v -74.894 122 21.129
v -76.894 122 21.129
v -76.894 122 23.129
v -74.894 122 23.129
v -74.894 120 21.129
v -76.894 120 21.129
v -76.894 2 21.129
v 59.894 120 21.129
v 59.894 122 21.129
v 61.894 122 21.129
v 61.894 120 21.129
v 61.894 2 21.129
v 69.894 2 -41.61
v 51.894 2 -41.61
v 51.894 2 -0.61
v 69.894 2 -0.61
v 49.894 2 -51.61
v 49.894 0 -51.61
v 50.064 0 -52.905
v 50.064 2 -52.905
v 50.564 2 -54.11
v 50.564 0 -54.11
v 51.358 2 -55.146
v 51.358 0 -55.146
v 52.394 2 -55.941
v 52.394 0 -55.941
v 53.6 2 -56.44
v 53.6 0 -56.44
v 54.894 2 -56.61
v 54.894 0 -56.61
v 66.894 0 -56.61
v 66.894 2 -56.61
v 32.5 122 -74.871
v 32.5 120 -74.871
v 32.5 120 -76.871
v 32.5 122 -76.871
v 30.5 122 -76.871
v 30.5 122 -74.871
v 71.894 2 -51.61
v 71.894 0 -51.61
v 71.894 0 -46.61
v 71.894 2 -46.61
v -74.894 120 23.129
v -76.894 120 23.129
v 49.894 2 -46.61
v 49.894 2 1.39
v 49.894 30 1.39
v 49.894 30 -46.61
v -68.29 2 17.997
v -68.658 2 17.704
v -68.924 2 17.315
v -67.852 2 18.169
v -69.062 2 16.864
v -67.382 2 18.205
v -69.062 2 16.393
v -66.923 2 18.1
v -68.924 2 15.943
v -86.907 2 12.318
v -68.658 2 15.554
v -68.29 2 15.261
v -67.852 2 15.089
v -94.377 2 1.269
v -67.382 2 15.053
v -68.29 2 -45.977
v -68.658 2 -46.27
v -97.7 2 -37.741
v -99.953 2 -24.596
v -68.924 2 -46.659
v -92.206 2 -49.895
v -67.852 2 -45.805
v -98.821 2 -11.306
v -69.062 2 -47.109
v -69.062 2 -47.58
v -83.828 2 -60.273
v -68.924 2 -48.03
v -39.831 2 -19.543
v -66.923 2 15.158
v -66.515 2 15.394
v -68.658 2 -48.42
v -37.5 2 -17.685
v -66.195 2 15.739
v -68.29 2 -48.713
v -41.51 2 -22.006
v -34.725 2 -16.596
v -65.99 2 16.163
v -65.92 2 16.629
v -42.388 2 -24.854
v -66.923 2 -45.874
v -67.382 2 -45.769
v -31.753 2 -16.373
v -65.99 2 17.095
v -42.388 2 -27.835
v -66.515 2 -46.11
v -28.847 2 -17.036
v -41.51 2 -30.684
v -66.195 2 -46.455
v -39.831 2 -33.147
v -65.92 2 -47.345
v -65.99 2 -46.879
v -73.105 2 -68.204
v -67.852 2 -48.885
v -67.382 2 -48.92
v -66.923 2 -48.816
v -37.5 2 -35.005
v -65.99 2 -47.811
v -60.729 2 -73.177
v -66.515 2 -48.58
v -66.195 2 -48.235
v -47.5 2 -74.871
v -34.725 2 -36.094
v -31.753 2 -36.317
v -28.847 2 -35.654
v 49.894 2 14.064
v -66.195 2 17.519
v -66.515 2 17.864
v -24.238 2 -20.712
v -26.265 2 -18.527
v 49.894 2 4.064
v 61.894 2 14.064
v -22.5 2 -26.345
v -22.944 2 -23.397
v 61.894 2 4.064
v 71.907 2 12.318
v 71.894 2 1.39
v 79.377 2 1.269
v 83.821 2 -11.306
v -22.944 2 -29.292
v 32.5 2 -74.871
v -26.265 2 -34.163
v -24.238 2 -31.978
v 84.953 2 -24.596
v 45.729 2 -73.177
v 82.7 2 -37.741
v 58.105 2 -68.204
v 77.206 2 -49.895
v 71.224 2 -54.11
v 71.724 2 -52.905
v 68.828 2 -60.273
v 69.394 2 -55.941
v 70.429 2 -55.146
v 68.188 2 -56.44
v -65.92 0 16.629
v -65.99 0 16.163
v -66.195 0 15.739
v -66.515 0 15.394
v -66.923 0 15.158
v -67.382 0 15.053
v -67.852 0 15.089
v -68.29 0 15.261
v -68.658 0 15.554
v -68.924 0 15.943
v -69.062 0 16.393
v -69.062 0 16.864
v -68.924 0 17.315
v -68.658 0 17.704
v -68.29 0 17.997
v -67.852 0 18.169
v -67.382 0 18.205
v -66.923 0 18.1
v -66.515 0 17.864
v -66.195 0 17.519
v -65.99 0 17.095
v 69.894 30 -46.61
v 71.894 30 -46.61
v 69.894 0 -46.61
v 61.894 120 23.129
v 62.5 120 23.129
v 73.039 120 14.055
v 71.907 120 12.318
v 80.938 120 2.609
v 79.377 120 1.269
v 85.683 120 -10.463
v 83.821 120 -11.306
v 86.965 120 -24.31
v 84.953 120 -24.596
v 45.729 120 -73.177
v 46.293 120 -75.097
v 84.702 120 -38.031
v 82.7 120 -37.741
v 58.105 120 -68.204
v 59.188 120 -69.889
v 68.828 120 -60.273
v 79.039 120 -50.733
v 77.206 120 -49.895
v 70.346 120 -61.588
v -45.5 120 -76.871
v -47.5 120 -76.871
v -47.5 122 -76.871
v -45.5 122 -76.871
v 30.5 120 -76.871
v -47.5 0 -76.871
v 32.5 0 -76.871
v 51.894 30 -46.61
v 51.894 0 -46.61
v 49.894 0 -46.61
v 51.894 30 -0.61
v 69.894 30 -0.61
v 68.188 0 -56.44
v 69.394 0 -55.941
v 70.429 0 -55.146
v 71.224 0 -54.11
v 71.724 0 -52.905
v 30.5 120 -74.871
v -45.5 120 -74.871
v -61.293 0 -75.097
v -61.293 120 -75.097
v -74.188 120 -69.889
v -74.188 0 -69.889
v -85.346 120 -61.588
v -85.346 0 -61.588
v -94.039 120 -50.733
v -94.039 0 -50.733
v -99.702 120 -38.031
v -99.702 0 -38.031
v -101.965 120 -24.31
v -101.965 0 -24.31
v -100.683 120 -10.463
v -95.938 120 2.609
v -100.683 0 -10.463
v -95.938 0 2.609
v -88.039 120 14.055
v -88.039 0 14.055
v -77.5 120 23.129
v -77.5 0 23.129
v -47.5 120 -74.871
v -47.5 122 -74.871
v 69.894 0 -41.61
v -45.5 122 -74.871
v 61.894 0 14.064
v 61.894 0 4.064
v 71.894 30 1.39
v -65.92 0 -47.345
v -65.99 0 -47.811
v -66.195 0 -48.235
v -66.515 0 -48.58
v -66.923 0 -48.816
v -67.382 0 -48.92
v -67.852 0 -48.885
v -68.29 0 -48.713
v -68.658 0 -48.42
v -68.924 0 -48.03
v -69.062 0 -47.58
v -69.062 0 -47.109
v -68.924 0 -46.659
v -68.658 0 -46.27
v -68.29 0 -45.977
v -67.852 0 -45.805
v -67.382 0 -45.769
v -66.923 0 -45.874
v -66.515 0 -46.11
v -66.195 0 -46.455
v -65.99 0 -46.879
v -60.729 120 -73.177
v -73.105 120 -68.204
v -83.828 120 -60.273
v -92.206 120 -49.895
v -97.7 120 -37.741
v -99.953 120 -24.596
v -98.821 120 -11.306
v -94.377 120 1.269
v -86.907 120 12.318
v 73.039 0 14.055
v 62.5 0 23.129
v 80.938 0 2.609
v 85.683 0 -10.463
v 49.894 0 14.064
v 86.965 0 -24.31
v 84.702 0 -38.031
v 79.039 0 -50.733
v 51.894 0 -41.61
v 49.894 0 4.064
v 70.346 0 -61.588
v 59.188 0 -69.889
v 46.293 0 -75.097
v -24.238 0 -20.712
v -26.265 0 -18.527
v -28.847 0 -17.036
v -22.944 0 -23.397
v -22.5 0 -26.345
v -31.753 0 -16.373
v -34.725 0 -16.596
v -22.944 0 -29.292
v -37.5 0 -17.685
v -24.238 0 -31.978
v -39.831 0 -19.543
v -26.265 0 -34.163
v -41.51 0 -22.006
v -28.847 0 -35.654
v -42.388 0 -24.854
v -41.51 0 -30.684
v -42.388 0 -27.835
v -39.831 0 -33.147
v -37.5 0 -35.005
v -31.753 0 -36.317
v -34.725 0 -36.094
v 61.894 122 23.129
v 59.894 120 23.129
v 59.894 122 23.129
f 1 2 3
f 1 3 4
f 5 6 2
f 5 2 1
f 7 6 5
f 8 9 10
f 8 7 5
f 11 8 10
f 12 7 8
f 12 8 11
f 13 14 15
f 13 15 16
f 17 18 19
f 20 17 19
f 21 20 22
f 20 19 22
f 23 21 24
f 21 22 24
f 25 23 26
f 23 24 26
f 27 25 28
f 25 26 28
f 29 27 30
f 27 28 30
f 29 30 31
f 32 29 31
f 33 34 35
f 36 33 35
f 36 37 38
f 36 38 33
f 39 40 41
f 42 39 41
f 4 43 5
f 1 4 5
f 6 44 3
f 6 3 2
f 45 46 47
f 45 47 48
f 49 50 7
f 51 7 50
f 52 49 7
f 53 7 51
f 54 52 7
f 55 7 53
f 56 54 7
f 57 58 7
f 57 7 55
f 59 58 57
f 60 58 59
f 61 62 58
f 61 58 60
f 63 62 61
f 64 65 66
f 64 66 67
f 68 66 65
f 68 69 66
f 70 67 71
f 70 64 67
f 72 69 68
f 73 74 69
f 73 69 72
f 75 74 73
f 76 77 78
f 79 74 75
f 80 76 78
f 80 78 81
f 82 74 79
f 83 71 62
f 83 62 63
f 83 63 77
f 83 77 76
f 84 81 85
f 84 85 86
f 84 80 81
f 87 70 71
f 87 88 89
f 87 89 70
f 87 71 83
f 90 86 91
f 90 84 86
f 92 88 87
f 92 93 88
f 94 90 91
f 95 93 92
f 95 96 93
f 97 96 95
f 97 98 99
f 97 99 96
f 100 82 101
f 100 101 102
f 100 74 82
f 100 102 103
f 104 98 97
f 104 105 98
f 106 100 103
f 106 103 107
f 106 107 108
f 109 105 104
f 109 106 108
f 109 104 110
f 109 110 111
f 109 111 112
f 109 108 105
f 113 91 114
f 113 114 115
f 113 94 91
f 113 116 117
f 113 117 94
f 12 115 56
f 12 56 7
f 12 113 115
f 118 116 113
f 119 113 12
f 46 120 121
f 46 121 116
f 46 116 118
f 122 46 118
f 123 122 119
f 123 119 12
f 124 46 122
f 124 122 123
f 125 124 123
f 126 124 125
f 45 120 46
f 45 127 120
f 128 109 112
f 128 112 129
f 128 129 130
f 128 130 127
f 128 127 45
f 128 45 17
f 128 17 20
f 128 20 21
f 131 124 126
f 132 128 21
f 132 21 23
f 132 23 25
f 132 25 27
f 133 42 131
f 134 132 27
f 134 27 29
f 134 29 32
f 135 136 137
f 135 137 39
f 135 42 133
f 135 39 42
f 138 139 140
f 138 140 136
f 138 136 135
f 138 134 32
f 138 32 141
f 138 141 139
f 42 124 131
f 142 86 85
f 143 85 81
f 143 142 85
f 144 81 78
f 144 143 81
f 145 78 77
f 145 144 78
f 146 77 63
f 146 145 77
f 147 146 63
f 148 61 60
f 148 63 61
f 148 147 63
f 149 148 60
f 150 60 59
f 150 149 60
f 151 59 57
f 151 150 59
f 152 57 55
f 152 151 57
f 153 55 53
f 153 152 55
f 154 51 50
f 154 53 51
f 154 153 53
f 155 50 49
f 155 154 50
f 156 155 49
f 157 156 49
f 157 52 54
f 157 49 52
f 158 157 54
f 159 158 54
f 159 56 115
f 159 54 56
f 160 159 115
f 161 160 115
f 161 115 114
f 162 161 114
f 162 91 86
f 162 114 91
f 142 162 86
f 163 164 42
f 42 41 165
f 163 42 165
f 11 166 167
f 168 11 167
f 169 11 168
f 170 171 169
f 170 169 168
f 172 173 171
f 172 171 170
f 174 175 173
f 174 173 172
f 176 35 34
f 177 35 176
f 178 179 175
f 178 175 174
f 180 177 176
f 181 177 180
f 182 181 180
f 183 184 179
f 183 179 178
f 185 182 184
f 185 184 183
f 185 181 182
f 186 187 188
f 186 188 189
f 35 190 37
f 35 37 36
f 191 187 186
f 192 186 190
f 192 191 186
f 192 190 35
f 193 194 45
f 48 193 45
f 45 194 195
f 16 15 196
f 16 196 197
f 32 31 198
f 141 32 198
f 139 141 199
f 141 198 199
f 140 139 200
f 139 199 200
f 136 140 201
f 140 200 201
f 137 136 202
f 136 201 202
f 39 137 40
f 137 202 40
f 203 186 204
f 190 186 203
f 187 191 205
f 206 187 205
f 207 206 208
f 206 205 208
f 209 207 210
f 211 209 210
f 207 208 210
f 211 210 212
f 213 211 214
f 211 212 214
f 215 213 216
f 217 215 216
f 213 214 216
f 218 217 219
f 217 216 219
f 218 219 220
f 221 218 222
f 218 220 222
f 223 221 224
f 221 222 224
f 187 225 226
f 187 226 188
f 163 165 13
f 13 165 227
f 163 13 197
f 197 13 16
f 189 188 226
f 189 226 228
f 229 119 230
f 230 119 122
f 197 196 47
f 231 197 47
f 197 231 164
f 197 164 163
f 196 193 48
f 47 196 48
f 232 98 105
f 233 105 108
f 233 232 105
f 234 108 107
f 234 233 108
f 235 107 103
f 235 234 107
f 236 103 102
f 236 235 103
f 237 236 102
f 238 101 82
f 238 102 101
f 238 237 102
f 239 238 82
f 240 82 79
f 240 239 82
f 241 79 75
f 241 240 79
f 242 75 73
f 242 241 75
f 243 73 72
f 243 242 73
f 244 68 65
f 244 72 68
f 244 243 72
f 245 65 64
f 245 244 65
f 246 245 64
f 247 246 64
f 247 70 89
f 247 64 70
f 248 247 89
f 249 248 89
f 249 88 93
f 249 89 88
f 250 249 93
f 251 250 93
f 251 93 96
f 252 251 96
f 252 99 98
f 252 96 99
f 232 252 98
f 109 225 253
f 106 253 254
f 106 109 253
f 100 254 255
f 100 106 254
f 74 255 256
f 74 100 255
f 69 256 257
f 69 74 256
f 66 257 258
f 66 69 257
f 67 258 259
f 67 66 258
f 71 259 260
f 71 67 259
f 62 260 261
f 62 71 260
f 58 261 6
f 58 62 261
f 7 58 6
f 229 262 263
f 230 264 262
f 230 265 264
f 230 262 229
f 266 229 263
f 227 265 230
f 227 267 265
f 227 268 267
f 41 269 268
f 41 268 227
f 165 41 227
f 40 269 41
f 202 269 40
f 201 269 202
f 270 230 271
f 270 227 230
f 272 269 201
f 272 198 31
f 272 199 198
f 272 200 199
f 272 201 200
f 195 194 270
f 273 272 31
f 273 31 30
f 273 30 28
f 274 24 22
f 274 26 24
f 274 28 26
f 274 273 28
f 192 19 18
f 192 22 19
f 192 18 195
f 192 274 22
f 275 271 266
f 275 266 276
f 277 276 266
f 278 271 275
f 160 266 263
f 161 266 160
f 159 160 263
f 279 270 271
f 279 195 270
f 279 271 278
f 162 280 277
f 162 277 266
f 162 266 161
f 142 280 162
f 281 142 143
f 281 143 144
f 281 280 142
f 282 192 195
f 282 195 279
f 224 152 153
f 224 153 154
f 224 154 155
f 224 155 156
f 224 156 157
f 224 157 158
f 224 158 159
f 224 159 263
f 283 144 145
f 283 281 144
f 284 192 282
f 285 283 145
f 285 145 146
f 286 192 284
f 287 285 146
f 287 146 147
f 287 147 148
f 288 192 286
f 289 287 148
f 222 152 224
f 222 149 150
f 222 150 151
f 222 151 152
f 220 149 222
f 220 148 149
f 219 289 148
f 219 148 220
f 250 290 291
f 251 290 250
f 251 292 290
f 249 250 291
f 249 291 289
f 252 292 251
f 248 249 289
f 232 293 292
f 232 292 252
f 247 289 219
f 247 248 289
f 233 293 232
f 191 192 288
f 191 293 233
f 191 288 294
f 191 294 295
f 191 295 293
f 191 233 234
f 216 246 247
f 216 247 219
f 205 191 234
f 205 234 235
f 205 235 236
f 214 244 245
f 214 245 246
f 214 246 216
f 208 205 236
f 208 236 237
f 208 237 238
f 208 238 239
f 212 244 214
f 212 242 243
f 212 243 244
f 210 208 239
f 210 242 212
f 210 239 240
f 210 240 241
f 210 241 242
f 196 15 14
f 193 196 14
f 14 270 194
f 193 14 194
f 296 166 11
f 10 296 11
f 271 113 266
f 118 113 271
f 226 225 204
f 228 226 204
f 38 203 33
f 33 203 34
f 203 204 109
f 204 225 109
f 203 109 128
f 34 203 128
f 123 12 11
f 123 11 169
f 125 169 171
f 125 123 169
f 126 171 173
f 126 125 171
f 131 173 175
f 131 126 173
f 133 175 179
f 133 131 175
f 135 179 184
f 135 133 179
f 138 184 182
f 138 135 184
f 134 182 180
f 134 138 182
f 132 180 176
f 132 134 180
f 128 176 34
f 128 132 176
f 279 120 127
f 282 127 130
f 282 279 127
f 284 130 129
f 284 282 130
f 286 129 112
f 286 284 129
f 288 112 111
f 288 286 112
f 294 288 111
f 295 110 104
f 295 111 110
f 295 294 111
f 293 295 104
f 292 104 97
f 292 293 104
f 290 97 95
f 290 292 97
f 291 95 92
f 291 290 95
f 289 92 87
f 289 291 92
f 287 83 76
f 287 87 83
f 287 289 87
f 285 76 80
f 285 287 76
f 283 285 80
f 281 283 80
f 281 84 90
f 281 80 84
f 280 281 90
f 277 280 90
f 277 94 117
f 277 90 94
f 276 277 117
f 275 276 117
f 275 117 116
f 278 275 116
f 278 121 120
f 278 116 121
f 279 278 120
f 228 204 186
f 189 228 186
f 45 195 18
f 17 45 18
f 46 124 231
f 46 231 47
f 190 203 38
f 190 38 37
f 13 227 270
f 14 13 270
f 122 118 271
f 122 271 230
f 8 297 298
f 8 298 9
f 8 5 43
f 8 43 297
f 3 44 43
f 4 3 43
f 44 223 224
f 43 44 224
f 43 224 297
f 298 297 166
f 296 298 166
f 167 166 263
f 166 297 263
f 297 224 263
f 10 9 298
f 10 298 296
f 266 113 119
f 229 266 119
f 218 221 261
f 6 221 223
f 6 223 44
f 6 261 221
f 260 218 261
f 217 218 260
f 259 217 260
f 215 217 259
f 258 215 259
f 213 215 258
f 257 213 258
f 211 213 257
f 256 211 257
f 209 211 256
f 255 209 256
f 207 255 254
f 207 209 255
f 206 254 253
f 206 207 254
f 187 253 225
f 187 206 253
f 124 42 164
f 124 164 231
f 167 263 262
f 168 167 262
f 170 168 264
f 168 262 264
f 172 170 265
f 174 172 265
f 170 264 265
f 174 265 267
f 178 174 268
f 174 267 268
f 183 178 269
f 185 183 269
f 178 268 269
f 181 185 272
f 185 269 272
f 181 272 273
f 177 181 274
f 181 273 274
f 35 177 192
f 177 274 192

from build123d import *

# Parameters (mm, degrees)
BOSS_EXTRUDE2_DEPTH = 120
SHELL2_T            = -2
SKETCH12_W          = 12
SKETCH12_H          = 10
CUT_EXTRUDE4_DEPTH  = 5
CUT_EXTRUDE8_REACH  = 122
SKETCH22_R          = 1.58
SKETCH22_R_2        = 10
BOSS_EXTRUDE4_DEPTH = 30
CUT_EXTRUDE9_REACH  = 122
SKETCH27_W          = 2
SKETCH27_H          = 2
BOSS_EXTRUDE5_DEPTH = 2


with BuildPart() as part:
    # Sketch1 → Boss-Extrude2 (new body)
    with BuildSketch(Plane(origin=(0, 0, 0), x_dir=(1, 0, 0), z_dir=(0, 1, 0))):
        with BuildLine():
            Line((-77.5, -23.128972286), (62.5, -23.128972286))
            ThreePointArc((62.5, -23.128972286), (84.701532545, 38.031487477), (32.5, 76.871027714))
            Line((32.5, 76.871027714), (-47.5, 76.871027714))
            ThreePointArc((-47.5, 76.871027714), (-99.701532545, 38.031487477), (-77.5, -23.128972286))
        make_face()
    extrude(amount=BOSS_EXTRUDE2_DEPTH)

    # Shell2
    shell2_openings = [part.faces().sort_by_distance(p)[0] for p in [
        (-7.5, 120, -32.451257595),
    ]]
    offset(amount=SHELL2_T, openings=shell2_openings, kind=Kind.INTERSECTION)

    # Sketch12 → Cut-Extrude4 (cut)
    with BuildSketch(Plane(origin=(0, 2, 0), x_dir=(1, 0, 0), z_dir=(0, 1, 0))):
        with Locations((55.893876913, -9.063838959)):
            Rectangle(SKETCH12_W, SKETCH12_H)
    extrude(amount=-CUT_EXTRUDE4_DEPTH, mode=Mode.SUBTRACT)

    # Sketch22 → Cut-Extrude8 (cut, up to next)
    with BuildSketch(Plane(origin=(0, 0, 0), x_dir=(1, 0, 0), z_dir=(0, 1, 0)), mode=Mode.PRIVATE) as cut_extrude8_sk1:
        with Locations((-67.5, -16.628972286)):
            Circle(SKETCH22_R)
    cut_extrude8_tool1 = extrude(cut_extrude8_sk1.sketch, amount=CUT_EXTRUDE8_REACH, mode=Mode.PRIVATE) & part.part
    add(cut_extrude8_tool1.solids().sort_by_distance((-67.5, 0, 16.628972))[0], mode=Mode.SUBTRACT)
    # Sketch22 → Cut-Extrude8 (cut, up to next)
    with BuildSketch(Plane(origin=(0, 0, 0), x_dir=(1, 0, 0), z_dir=(0, 1, 0)), mode=Mode.PRIVATE) as cut_extrude8_sk2:
        with Locations((-67.5, 47.344907447)):
            Circle(SKETCH22_R)
    cut_extrude8_tool2 = extrude(cut_extrude8_sk2.sketch, amount=CUT_EXTRUDE8_REACH, mode=Mode.PRIVATE) & part.part
    add(cut_extrude8_tool2.solids().sort_by_distance((-67.5, 0, -47.344907))[0], mode=Mode.SUBTRACT)
    # Sketch22 → Cut-Extrude8 (cut, up to next)
    with BuildSketch(Plane(origin=(0, 0, 0), x_dir=(1, 0, 0), z_dir=(0, 1, 0)), mode=Mode.PRIVATE) as cut_extrude8_sk3:
        with Locations((-32.5, 26.344907447)):
            Circle(SKETCH22_R_2)
    cut_extrude8_tool3 = extrude(cut_extrude8_sk3.sketch, amount=CUT_EXTRUDE8_REACH, mode=Mode.PRIVATE) & part.part
    add(cut_extrude8_tool3.solids().sort_by_distance((-32.5, 0, -26.344907))[0], mode=Mode.SUBTRACT)

    # Sketch23 → Boss-Extrude4 (add)
    with BuildSketch(Plane(origin=(0, 0, 0), x_dir=(1, 0, 0), z_dir=(0, 1, 0))):
        Polygon((51.893876913, 46.61041607), (51.893876913, 0.61041607), (69.893876913, 0.61041607), (69.893876913, 46.61041607), (71.893876913, 46.61041607), (71.893876913, -1.38958393), (49.893876913, -1.38958393), (49.893876913, 46.61041607), align=None)
    extrude(amount=BOSS_EXTRUDE4_DEPTH)

    # Sketch24 → Cut-Extrude9 (cut, up to next)
    with BuildSketch(Plane(origin=(0, 0, 0), x_dir=(1, 0, 0), z_dir=(0, 1, 0)), mode=Mode.PRIVATE) as cut_extrude9_sk1:
        with BuildLine():
            Line((54.893876913, 56.61041607), (66.893876913, 56.61041607))
            ThreePointArc((66.893876913, 56.61041607), (70.429410819, 55.145949976), (71.893876913, 51.61041607))
            Line((71.893876913, 51.61041607), (71.893876913, 46.61041607))
            Line((71.893876913, 46.61041607), (69.893876913, 46.61041607))
            Line((69.893876913, 46.61041607), (69.893876913, 41.61041607))
            Line((69.893876913, 41.61041607), (51.893876913, 41.61041607))
            Line((51.893876913, 41.61041607), (51.893876913, 46.61041607))
            Line((51.893876913, 46.61041607), (49.893876913, 46.61041607))
            Line((49.893876913, 46.61041607), (49.893876913, 51.61041607))
            ThreePointArc((49.893876913, 51.61041607), (51.358343007, 55.145949976), (54.893876913, 56.61041607))
        make_face()
    cut_extrude9_tool1 = extrude(cut_extrude9_sk1.sketch, amount=CUT_EXTRUDE9_REACH, mode=Mode.PRIVATE) & part.part
    add(cut_extrude9_tool1.solids().sort_by_distance((60.893877, 0, -49.215699))[0], mode=Mode.SUBTRACT)

    # Sketch27 → Boss-Extrude5 (add)
    with BuildSketch(Plane(origin=(0, 120, 0), x_dir=(1, 0, 0), z_dir=(0, 1, 0))):
        with Locations((-46.5, 75.871027714)):
            Rectangle(SKETCH27_W, SKETCH27_H)
        with Locations((31.5, 75.871027714)):
            Rectangle(SKETCH27_W, SKETCH27_H)
        with Locations((60.893876913, -22.128972286)):
            Rectangle(SKETCH27_W, SKETCH27_H)
        with Locations((-75.893876913, -22.128972286)):
            Rectangle(SKETCH27_W, SKETCH27_H)
    extrude(amount=BOSS_EXTRUDE5_DEPTH)


solid = part.part
